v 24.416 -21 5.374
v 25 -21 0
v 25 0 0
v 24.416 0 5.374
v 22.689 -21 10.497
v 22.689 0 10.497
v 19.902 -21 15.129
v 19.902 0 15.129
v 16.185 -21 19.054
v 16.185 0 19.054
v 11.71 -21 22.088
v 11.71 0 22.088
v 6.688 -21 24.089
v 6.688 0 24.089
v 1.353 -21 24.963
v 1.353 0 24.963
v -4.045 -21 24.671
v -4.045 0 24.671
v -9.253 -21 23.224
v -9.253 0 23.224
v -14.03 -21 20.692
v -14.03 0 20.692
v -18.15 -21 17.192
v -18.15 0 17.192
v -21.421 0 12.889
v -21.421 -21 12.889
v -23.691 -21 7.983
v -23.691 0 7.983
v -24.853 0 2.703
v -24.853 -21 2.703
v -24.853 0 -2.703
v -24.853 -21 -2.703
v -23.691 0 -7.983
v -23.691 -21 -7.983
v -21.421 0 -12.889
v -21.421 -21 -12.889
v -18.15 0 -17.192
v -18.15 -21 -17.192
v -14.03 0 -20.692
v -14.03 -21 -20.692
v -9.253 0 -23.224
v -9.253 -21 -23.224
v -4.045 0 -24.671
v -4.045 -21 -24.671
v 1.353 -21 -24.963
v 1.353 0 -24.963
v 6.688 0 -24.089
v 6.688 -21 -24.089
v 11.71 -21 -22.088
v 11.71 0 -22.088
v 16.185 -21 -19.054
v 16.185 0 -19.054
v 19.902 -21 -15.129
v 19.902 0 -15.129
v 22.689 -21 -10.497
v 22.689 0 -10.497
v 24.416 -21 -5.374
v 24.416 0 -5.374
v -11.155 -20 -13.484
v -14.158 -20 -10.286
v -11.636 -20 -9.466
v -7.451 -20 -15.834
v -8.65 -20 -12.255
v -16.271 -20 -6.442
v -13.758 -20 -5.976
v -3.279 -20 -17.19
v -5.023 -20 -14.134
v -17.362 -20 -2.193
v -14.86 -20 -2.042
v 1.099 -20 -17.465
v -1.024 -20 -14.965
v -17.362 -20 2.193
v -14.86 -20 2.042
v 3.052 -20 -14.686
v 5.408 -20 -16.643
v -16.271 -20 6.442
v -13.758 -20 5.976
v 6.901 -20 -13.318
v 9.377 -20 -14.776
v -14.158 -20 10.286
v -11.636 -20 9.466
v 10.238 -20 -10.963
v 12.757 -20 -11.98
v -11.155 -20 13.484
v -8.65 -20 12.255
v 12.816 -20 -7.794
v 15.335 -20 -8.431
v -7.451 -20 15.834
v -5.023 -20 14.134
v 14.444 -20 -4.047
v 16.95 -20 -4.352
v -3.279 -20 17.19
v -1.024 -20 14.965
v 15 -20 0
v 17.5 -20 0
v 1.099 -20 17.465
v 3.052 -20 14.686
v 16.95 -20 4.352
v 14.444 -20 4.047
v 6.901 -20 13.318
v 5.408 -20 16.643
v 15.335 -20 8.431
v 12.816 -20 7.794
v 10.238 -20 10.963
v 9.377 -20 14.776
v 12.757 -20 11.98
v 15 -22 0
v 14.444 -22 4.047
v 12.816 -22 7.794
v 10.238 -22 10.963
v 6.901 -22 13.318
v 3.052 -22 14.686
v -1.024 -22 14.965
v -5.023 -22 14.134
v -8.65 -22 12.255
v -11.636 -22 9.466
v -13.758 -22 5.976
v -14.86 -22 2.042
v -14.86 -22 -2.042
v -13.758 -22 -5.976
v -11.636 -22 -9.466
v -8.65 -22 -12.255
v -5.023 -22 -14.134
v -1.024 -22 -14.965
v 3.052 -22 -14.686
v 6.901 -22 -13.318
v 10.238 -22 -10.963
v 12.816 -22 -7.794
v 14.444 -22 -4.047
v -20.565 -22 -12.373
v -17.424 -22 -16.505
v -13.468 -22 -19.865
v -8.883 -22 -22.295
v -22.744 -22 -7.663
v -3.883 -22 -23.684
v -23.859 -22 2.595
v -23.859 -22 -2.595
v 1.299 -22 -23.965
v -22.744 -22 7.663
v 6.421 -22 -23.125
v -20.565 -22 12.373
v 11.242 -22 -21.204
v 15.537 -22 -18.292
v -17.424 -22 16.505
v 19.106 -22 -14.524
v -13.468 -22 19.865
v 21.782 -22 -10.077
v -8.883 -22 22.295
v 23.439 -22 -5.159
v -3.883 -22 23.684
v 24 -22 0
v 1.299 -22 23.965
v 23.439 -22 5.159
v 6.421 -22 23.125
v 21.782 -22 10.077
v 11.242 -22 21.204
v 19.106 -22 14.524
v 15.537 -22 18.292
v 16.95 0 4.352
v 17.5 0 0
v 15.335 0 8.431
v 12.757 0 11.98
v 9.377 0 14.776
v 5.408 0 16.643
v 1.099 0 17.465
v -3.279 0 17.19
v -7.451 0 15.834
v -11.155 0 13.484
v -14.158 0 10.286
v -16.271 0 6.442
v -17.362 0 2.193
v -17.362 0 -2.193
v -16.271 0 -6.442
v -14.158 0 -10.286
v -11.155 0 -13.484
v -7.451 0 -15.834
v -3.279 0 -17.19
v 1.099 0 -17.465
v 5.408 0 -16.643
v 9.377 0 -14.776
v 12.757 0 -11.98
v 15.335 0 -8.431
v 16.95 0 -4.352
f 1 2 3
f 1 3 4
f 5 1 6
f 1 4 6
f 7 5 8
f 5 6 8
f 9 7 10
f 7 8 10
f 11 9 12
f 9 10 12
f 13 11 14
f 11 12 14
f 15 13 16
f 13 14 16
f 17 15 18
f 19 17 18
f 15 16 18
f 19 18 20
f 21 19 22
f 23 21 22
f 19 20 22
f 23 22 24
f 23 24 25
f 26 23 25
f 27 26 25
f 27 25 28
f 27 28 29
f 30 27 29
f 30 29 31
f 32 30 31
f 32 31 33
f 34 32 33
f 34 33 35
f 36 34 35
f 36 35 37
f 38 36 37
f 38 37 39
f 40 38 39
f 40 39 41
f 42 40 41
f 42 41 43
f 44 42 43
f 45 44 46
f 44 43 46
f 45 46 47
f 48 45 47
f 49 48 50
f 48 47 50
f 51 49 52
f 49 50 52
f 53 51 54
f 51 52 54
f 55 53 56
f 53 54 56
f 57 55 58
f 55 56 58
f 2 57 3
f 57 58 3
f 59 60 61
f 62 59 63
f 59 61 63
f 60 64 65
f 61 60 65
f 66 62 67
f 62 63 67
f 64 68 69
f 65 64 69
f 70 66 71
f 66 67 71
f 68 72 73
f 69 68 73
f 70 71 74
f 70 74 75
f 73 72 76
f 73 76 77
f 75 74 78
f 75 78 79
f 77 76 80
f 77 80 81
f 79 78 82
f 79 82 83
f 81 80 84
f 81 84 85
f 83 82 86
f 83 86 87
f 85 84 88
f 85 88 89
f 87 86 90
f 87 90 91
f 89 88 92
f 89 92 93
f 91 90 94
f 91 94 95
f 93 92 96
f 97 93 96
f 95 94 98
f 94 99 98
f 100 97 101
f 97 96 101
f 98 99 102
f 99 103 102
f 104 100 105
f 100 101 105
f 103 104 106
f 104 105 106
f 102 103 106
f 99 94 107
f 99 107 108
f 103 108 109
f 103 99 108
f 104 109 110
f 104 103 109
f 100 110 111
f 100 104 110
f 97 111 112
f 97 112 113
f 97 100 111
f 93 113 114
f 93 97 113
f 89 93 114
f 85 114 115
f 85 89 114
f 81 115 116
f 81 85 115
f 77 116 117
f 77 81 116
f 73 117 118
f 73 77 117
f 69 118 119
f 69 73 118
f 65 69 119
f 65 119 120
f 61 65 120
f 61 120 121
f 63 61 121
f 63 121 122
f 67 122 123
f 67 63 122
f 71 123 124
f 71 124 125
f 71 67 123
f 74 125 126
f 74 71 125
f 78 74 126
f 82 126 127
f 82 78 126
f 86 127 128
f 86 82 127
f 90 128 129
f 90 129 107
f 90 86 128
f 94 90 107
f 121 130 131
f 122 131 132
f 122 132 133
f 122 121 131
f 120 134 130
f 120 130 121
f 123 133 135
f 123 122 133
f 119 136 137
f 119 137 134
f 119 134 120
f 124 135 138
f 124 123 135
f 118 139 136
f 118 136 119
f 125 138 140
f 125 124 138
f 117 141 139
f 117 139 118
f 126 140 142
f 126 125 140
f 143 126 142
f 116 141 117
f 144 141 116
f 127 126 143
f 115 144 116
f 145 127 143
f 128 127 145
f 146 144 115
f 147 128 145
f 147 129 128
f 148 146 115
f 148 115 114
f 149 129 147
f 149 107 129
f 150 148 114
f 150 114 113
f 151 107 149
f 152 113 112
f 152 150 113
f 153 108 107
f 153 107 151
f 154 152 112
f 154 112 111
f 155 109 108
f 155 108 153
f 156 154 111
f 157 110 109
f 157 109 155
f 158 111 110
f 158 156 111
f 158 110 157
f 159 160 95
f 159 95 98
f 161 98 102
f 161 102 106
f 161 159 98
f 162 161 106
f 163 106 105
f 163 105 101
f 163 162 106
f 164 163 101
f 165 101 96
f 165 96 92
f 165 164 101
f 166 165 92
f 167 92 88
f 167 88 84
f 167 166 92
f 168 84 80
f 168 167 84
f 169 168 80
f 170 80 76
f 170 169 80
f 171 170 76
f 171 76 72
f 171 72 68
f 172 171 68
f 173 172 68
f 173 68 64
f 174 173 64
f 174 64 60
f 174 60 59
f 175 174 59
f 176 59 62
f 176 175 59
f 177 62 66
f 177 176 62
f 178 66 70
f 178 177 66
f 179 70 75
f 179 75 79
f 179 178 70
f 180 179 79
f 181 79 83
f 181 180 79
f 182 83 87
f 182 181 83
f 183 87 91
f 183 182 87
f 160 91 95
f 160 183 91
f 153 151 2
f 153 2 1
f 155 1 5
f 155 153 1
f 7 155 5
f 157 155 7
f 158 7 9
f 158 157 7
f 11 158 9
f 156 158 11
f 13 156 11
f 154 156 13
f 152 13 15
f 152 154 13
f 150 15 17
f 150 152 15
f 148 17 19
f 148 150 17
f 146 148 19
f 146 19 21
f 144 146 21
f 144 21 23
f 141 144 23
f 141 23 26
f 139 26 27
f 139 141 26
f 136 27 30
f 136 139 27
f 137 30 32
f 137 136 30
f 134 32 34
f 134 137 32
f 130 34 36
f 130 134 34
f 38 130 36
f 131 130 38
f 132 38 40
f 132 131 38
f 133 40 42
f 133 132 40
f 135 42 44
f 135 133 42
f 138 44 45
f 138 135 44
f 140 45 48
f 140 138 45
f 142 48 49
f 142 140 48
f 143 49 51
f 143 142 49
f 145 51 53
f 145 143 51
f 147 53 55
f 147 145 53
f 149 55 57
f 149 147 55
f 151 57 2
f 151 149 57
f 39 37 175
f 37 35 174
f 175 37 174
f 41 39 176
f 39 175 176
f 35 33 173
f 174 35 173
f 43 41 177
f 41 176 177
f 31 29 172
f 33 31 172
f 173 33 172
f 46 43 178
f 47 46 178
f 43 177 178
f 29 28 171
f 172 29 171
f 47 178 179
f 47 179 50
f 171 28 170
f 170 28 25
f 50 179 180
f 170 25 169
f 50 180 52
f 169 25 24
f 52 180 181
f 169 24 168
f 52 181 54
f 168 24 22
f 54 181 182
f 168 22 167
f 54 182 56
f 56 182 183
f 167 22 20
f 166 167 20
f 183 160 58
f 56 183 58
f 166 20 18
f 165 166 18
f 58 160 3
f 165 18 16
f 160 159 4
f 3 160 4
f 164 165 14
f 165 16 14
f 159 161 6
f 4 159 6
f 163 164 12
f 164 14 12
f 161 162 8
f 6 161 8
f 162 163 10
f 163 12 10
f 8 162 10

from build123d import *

# Parameters (mm, degrees)
F0_R     = 25
F0_R_2   = 17.5
F1_DEPTH = 20
F2_R     = 25
F2_R_2   = 15
F3_DEPTH = 2
F4_SIZE  = 1


with BuildPart() as f1:
    # F0 (on Front) → F1 (new body)
    with BuildSketch(Plane.XZ):
        Circle(F0_R)
        Circle(F0_R_2, mode=Mode.SUBTRACT)
    extrude(amount=F1_DEPTH)

    # F2 (on face) → F3 (join)
    with BuildSketch(Plane.XZ.offset(20)):
        Circle(F2_R)
        Circle(F2_R_2, mode=Mode.SUBTRACT)
    extrude(amount=F3_DEPTH)

    # F4
    f4_edges = [f1.edges().sort_by_distance(p)[0] for p in [
        (-25, -22, 0),
    ]]
    chamfer(f4_edges, length=F4_SIZE)


solid = f1.part
